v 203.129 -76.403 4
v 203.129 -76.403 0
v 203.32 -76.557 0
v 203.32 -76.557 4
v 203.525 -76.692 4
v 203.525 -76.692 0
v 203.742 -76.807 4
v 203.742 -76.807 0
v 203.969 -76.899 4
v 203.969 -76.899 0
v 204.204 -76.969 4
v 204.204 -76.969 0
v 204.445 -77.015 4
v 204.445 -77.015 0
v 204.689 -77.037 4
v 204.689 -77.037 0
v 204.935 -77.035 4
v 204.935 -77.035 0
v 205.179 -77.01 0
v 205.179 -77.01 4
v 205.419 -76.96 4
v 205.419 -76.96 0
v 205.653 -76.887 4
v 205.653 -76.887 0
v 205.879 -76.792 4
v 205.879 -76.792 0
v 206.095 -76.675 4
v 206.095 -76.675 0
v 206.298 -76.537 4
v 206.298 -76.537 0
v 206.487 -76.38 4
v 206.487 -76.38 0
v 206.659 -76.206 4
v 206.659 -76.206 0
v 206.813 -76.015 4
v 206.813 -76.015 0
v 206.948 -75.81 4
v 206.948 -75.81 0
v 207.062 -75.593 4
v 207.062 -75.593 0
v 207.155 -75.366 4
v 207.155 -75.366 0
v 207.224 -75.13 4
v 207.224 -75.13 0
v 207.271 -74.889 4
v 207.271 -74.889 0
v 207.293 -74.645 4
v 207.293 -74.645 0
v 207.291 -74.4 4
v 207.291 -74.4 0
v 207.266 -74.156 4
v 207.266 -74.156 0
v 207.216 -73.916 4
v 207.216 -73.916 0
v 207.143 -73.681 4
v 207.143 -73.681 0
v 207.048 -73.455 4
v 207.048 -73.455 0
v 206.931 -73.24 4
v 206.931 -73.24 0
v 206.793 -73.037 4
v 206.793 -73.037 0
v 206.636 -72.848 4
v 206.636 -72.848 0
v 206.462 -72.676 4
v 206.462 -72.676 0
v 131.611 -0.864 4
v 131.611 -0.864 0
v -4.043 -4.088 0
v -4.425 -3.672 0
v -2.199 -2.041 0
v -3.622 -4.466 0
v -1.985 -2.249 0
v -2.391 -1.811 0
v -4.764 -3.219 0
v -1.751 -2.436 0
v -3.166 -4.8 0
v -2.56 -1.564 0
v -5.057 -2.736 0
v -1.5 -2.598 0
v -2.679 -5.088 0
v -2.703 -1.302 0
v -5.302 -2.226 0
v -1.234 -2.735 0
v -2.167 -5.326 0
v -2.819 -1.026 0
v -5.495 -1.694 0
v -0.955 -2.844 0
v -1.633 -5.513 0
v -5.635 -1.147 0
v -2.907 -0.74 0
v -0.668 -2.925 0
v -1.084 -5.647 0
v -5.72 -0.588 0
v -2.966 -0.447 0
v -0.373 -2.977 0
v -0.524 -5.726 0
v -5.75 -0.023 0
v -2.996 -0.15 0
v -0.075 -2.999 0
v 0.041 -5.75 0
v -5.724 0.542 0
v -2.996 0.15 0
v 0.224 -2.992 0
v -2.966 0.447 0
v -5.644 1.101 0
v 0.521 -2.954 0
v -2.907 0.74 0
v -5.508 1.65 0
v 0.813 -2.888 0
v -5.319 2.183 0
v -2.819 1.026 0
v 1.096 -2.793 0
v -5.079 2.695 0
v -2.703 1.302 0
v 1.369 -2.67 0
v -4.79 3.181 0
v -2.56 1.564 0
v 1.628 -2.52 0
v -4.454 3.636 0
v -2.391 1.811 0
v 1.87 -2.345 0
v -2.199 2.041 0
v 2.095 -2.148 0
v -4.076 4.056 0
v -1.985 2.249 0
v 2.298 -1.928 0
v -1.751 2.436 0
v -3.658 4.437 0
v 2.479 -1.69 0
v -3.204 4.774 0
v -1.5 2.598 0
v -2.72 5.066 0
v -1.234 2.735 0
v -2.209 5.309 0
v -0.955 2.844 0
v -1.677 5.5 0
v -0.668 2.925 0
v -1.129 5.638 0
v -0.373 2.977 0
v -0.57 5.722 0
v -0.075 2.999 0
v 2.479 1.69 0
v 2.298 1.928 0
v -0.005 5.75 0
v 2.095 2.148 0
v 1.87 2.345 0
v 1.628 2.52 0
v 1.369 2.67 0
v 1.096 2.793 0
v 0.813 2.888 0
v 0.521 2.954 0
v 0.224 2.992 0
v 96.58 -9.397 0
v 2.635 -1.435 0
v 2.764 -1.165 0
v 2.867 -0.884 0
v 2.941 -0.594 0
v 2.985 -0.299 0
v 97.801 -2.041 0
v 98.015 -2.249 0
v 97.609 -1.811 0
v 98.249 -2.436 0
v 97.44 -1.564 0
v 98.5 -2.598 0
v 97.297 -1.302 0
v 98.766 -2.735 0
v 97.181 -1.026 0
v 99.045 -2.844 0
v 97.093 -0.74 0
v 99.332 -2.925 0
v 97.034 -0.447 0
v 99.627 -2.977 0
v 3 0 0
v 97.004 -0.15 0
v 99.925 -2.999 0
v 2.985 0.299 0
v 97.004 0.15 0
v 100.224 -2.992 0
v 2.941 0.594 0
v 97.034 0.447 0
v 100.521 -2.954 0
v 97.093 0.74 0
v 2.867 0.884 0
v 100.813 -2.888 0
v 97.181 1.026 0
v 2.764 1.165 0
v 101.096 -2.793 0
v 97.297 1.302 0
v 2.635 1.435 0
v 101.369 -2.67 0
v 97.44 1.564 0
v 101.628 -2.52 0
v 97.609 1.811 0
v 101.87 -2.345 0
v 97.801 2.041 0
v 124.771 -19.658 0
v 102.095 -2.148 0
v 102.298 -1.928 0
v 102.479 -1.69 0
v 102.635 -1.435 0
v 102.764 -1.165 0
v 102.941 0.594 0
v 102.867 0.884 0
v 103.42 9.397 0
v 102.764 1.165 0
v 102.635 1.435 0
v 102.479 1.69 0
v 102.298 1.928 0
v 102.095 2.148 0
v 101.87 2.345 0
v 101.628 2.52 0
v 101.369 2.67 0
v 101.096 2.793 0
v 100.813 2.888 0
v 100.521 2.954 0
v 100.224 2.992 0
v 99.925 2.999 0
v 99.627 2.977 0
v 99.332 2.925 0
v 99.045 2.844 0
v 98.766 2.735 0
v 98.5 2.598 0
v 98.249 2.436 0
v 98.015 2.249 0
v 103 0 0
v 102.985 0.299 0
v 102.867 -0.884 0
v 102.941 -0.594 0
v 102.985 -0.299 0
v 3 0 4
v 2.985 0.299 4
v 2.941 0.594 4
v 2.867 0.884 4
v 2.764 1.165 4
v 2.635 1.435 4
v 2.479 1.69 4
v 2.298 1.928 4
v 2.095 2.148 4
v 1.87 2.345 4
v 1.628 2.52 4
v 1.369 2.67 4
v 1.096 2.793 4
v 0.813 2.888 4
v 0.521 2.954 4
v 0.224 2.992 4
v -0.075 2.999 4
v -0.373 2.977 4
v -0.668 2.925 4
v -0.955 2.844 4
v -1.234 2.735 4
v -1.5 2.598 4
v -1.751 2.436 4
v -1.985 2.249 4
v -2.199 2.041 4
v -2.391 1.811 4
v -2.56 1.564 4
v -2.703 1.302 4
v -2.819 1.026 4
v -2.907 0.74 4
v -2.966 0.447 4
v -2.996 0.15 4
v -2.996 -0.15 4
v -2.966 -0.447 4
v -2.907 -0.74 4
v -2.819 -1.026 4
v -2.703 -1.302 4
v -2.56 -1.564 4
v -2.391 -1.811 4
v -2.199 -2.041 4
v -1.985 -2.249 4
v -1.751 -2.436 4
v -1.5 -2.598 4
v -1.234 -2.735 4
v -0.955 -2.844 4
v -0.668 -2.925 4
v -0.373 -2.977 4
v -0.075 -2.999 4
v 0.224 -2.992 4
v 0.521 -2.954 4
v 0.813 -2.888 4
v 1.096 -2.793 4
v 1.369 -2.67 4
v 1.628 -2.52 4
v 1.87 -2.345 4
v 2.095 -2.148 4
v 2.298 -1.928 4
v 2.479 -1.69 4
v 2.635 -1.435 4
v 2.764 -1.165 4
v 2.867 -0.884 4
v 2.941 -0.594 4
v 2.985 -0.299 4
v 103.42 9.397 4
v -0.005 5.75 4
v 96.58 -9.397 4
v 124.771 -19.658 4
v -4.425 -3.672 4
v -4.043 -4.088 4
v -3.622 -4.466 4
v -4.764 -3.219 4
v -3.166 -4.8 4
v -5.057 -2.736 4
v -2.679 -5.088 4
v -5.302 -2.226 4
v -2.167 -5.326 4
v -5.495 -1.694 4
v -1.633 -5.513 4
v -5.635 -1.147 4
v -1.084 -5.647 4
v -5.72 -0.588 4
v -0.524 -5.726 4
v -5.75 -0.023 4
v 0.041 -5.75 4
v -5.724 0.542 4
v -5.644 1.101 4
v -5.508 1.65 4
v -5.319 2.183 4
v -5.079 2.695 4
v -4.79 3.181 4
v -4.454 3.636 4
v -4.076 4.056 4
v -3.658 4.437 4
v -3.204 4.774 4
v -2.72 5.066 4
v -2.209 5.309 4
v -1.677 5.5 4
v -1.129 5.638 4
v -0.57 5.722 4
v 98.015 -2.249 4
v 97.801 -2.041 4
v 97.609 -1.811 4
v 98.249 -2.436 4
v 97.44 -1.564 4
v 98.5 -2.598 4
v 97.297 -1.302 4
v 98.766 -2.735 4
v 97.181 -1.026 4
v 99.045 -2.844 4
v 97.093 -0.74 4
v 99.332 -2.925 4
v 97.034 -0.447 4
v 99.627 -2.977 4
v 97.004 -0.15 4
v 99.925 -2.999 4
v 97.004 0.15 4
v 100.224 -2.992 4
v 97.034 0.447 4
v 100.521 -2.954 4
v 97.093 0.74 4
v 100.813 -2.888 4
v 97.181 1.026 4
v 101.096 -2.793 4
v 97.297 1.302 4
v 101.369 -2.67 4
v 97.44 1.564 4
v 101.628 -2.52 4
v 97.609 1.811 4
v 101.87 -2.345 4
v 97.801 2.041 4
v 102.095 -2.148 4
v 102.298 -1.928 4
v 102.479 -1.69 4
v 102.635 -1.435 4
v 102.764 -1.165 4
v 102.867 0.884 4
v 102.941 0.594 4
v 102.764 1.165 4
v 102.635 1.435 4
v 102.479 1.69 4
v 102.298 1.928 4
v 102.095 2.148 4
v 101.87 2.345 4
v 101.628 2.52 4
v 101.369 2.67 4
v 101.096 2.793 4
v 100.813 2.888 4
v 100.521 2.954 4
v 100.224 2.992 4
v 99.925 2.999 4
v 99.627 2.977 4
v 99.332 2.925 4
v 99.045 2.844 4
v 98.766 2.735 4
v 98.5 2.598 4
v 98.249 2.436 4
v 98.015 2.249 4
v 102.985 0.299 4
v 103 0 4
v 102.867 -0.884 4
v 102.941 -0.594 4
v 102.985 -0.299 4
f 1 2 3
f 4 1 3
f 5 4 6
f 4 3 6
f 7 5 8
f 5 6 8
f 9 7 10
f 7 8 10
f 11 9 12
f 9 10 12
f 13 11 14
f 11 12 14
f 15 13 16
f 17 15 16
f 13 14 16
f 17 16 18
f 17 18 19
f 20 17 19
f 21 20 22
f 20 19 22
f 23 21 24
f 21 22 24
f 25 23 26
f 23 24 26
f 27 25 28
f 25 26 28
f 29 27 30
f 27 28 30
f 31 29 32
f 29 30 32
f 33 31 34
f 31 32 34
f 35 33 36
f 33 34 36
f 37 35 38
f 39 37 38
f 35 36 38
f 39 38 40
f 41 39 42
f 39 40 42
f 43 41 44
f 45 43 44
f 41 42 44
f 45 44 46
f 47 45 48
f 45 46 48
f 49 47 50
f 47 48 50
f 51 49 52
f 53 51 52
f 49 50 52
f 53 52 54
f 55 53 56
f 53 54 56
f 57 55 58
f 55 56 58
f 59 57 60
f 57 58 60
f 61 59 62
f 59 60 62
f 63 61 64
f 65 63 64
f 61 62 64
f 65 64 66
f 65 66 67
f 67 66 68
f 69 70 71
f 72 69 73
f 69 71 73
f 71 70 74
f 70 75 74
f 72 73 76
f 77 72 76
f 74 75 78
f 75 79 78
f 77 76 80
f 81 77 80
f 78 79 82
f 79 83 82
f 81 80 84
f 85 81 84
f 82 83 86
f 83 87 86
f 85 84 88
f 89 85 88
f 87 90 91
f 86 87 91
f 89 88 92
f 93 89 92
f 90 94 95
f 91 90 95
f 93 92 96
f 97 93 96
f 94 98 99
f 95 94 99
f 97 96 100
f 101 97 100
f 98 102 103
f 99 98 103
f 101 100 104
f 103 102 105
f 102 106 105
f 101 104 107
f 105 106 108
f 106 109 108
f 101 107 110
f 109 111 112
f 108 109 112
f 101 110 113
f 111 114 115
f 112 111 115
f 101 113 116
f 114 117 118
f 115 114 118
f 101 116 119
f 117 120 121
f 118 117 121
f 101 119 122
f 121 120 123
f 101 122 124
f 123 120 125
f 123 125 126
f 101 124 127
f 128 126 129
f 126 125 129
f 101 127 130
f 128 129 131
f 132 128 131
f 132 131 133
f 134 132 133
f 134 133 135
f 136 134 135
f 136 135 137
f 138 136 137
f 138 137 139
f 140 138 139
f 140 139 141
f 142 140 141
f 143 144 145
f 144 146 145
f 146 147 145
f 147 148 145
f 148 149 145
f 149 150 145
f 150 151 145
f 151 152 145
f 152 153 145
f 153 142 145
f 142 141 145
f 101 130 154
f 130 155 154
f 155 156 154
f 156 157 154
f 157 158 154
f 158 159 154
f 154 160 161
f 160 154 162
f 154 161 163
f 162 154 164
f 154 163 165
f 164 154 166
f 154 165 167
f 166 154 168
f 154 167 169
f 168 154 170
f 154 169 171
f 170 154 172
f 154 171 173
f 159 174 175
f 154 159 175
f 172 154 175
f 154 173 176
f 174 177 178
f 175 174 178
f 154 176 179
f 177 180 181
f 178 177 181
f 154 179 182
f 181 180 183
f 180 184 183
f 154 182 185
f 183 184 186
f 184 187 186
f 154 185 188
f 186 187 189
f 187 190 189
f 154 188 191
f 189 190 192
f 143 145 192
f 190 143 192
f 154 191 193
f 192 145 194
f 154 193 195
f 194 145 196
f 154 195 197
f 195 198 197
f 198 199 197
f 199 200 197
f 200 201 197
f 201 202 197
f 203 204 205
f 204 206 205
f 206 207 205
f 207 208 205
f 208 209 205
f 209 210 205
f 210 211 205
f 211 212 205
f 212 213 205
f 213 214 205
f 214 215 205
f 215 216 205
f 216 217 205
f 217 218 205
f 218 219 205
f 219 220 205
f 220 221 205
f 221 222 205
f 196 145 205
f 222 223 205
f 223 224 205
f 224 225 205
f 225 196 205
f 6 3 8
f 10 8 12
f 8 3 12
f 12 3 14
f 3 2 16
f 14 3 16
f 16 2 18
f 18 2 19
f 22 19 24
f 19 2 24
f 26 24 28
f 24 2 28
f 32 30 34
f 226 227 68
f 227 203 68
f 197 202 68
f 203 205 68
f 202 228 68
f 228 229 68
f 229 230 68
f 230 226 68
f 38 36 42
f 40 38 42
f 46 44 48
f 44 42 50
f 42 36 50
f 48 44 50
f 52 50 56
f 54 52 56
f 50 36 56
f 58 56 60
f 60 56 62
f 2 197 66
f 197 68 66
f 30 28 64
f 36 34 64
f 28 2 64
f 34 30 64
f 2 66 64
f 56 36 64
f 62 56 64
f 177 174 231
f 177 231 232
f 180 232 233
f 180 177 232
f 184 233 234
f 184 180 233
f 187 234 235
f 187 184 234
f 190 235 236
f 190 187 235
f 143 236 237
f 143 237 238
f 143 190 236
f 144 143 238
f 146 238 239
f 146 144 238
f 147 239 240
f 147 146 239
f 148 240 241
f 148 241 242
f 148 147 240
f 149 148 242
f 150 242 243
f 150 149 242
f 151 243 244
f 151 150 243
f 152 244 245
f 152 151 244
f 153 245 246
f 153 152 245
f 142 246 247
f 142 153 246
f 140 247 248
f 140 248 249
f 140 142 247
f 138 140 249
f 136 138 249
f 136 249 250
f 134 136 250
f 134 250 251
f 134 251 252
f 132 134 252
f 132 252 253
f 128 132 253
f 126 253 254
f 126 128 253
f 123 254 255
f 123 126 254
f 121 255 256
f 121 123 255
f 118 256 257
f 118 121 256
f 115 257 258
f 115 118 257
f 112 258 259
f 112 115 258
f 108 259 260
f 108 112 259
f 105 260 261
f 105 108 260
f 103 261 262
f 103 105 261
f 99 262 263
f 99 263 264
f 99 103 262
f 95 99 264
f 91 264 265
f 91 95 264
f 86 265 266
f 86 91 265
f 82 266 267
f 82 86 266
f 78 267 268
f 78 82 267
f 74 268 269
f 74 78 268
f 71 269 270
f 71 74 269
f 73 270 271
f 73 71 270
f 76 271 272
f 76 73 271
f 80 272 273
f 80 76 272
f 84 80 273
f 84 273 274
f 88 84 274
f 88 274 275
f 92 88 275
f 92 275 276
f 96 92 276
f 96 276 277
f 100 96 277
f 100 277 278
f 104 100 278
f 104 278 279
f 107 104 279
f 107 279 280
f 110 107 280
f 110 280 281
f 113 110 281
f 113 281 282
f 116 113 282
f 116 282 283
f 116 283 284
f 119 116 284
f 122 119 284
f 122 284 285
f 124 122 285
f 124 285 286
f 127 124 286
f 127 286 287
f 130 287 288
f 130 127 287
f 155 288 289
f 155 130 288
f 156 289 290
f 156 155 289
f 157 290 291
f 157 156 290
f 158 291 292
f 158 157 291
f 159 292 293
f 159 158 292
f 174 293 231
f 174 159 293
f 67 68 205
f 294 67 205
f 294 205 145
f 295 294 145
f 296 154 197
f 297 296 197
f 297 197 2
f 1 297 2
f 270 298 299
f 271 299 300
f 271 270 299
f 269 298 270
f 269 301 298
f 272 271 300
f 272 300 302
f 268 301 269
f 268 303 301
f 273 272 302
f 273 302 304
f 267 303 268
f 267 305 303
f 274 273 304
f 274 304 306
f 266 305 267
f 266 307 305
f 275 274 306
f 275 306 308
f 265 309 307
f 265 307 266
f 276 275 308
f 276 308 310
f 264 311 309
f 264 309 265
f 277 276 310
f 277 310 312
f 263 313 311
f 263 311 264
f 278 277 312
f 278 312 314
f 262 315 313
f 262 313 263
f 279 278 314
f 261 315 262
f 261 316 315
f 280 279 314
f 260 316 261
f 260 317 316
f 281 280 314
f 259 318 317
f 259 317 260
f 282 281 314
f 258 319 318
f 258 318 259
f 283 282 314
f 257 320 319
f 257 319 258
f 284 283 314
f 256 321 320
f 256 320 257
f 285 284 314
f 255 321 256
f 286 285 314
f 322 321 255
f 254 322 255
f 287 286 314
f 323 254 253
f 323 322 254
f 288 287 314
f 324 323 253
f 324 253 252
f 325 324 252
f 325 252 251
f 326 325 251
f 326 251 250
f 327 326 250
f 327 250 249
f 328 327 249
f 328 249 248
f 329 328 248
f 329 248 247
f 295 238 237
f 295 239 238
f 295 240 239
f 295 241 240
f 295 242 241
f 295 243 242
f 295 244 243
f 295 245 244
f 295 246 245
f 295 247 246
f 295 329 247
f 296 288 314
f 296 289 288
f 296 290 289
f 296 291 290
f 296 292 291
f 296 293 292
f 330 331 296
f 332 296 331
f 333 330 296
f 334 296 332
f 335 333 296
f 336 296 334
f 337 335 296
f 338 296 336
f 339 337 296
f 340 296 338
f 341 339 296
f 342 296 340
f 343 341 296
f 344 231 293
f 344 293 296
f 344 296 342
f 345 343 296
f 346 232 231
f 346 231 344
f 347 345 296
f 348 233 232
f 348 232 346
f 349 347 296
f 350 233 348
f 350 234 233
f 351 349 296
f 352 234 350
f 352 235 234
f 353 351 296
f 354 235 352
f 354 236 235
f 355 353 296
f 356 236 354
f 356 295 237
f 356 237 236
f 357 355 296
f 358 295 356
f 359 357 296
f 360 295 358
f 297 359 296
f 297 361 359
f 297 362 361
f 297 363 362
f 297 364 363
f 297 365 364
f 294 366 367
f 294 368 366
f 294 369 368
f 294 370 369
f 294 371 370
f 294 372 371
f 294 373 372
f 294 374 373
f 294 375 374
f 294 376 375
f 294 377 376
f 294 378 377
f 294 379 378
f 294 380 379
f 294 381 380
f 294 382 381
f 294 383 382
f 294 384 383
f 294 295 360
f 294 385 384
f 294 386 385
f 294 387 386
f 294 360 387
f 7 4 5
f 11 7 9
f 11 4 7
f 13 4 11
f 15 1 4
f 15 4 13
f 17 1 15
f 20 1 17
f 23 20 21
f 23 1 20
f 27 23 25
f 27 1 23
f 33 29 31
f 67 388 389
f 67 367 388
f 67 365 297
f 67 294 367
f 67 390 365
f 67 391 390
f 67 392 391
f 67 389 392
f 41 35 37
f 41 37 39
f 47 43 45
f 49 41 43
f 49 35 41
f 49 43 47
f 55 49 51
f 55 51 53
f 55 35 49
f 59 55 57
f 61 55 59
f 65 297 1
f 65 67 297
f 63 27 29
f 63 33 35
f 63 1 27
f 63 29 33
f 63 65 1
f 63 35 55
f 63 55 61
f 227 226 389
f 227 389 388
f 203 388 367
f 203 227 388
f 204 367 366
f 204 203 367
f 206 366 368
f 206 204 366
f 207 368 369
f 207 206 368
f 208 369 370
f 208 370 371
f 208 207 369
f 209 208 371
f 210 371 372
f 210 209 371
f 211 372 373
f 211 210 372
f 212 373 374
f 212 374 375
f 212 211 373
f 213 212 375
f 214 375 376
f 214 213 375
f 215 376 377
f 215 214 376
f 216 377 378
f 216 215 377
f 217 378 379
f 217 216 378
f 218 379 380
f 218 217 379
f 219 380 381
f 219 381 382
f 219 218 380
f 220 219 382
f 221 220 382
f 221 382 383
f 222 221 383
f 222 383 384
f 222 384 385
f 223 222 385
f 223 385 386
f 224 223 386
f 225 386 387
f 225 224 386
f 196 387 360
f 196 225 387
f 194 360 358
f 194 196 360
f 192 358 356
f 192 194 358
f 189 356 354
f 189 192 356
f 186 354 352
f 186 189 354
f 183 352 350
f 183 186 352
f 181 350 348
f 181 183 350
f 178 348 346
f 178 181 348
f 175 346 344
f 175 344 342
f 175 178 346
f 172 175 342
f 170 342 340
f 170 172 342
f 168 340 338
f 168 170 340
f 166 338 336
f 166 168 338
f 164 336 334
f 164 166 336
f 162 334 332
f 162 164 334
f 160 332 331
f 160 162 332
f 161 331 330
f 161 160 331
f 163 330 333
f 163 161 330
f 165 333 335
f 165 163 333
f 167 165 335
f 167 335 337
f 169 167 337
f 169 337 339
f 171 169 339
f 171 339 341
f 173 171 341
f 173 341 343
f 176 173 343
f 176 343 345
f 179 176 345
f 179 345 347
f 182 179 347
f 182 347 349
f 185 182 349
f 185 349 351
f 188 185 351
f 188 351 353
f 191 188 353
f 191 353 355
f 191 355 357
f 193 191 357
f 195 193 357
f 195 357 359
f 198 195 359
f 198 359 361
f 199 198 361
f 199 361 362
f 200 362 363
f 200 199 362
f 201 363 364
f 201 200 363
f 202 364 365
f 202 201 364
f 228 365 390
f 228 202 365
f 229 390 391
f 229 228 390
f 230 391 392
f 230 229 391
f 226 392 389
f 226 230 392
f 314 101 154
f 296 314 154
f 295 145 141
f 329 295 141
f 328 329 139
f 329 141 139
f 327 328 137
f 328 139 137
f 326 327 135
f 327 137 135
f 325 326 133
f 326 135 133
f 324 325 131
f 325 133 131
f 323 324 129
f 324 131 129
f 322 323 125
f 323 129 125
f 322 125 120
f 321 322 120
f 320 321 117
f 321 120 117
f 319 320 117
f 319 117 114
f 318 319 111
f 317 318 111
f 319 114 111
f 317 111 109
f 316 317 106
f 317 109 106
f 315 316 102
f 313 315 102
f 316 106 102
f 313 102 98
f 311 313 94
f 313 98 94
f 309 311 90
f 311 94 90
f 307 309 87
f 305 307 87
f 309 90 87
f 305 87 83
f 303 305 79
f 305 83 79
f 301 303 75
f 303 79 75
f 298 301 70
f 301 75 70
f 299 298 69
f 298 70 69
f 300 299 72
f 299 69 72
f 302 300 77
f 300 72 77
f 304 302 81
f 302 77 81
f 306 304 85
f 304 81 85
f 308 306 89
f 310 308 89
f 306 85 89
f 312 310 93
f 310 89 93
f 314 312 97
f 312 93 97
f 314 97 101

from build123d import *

# Parameters (mm, degrees)
SKETCH1_R      = 3
EXTRUDE1_DEPTH = 4


with BuildPart() as part:
    # Sketch1 → Extrude1 (new body)
    with BuildSketch(Plane.XY):
        with BuildLine():
            Line((96.579798567, -9.396926208), (124.77057719, -19.657530508))
            Line((124.77057719, -19.657530508), (203.128908943, -76.403070631))
            ThreePointArc((203.128908943, -76.403070631), (206.658928298, -76.205679261), (206.461536928, -72.675659906))
            Line((206.461536928, -72.675659906), (131.610980057, -0.863678092))
            Line((131.610980057, -0.863678092), (103.420201433, 9.396926208))
            Line((103.420201433, 9.396926208), (-0.005150596, 5.749997693))
            ThreePointArc((-0.005150596, 5.749997693), (-5.74995391, -0.023022325), (0.040893831, -5.74985458))
            Line((0.040893831, -5.74985458), (96.579798567, -9.396926208))
        make_face()
        Circle(SKETCH1_R, mode=Mode.SUBTRACT)
        with Locations((100, 0)):
            Circle(SKETCH1_R, mode=Mode.SUBTRACT)
    extrude(amount=EXTRUDE1_DEPTH)


solid = part.part
